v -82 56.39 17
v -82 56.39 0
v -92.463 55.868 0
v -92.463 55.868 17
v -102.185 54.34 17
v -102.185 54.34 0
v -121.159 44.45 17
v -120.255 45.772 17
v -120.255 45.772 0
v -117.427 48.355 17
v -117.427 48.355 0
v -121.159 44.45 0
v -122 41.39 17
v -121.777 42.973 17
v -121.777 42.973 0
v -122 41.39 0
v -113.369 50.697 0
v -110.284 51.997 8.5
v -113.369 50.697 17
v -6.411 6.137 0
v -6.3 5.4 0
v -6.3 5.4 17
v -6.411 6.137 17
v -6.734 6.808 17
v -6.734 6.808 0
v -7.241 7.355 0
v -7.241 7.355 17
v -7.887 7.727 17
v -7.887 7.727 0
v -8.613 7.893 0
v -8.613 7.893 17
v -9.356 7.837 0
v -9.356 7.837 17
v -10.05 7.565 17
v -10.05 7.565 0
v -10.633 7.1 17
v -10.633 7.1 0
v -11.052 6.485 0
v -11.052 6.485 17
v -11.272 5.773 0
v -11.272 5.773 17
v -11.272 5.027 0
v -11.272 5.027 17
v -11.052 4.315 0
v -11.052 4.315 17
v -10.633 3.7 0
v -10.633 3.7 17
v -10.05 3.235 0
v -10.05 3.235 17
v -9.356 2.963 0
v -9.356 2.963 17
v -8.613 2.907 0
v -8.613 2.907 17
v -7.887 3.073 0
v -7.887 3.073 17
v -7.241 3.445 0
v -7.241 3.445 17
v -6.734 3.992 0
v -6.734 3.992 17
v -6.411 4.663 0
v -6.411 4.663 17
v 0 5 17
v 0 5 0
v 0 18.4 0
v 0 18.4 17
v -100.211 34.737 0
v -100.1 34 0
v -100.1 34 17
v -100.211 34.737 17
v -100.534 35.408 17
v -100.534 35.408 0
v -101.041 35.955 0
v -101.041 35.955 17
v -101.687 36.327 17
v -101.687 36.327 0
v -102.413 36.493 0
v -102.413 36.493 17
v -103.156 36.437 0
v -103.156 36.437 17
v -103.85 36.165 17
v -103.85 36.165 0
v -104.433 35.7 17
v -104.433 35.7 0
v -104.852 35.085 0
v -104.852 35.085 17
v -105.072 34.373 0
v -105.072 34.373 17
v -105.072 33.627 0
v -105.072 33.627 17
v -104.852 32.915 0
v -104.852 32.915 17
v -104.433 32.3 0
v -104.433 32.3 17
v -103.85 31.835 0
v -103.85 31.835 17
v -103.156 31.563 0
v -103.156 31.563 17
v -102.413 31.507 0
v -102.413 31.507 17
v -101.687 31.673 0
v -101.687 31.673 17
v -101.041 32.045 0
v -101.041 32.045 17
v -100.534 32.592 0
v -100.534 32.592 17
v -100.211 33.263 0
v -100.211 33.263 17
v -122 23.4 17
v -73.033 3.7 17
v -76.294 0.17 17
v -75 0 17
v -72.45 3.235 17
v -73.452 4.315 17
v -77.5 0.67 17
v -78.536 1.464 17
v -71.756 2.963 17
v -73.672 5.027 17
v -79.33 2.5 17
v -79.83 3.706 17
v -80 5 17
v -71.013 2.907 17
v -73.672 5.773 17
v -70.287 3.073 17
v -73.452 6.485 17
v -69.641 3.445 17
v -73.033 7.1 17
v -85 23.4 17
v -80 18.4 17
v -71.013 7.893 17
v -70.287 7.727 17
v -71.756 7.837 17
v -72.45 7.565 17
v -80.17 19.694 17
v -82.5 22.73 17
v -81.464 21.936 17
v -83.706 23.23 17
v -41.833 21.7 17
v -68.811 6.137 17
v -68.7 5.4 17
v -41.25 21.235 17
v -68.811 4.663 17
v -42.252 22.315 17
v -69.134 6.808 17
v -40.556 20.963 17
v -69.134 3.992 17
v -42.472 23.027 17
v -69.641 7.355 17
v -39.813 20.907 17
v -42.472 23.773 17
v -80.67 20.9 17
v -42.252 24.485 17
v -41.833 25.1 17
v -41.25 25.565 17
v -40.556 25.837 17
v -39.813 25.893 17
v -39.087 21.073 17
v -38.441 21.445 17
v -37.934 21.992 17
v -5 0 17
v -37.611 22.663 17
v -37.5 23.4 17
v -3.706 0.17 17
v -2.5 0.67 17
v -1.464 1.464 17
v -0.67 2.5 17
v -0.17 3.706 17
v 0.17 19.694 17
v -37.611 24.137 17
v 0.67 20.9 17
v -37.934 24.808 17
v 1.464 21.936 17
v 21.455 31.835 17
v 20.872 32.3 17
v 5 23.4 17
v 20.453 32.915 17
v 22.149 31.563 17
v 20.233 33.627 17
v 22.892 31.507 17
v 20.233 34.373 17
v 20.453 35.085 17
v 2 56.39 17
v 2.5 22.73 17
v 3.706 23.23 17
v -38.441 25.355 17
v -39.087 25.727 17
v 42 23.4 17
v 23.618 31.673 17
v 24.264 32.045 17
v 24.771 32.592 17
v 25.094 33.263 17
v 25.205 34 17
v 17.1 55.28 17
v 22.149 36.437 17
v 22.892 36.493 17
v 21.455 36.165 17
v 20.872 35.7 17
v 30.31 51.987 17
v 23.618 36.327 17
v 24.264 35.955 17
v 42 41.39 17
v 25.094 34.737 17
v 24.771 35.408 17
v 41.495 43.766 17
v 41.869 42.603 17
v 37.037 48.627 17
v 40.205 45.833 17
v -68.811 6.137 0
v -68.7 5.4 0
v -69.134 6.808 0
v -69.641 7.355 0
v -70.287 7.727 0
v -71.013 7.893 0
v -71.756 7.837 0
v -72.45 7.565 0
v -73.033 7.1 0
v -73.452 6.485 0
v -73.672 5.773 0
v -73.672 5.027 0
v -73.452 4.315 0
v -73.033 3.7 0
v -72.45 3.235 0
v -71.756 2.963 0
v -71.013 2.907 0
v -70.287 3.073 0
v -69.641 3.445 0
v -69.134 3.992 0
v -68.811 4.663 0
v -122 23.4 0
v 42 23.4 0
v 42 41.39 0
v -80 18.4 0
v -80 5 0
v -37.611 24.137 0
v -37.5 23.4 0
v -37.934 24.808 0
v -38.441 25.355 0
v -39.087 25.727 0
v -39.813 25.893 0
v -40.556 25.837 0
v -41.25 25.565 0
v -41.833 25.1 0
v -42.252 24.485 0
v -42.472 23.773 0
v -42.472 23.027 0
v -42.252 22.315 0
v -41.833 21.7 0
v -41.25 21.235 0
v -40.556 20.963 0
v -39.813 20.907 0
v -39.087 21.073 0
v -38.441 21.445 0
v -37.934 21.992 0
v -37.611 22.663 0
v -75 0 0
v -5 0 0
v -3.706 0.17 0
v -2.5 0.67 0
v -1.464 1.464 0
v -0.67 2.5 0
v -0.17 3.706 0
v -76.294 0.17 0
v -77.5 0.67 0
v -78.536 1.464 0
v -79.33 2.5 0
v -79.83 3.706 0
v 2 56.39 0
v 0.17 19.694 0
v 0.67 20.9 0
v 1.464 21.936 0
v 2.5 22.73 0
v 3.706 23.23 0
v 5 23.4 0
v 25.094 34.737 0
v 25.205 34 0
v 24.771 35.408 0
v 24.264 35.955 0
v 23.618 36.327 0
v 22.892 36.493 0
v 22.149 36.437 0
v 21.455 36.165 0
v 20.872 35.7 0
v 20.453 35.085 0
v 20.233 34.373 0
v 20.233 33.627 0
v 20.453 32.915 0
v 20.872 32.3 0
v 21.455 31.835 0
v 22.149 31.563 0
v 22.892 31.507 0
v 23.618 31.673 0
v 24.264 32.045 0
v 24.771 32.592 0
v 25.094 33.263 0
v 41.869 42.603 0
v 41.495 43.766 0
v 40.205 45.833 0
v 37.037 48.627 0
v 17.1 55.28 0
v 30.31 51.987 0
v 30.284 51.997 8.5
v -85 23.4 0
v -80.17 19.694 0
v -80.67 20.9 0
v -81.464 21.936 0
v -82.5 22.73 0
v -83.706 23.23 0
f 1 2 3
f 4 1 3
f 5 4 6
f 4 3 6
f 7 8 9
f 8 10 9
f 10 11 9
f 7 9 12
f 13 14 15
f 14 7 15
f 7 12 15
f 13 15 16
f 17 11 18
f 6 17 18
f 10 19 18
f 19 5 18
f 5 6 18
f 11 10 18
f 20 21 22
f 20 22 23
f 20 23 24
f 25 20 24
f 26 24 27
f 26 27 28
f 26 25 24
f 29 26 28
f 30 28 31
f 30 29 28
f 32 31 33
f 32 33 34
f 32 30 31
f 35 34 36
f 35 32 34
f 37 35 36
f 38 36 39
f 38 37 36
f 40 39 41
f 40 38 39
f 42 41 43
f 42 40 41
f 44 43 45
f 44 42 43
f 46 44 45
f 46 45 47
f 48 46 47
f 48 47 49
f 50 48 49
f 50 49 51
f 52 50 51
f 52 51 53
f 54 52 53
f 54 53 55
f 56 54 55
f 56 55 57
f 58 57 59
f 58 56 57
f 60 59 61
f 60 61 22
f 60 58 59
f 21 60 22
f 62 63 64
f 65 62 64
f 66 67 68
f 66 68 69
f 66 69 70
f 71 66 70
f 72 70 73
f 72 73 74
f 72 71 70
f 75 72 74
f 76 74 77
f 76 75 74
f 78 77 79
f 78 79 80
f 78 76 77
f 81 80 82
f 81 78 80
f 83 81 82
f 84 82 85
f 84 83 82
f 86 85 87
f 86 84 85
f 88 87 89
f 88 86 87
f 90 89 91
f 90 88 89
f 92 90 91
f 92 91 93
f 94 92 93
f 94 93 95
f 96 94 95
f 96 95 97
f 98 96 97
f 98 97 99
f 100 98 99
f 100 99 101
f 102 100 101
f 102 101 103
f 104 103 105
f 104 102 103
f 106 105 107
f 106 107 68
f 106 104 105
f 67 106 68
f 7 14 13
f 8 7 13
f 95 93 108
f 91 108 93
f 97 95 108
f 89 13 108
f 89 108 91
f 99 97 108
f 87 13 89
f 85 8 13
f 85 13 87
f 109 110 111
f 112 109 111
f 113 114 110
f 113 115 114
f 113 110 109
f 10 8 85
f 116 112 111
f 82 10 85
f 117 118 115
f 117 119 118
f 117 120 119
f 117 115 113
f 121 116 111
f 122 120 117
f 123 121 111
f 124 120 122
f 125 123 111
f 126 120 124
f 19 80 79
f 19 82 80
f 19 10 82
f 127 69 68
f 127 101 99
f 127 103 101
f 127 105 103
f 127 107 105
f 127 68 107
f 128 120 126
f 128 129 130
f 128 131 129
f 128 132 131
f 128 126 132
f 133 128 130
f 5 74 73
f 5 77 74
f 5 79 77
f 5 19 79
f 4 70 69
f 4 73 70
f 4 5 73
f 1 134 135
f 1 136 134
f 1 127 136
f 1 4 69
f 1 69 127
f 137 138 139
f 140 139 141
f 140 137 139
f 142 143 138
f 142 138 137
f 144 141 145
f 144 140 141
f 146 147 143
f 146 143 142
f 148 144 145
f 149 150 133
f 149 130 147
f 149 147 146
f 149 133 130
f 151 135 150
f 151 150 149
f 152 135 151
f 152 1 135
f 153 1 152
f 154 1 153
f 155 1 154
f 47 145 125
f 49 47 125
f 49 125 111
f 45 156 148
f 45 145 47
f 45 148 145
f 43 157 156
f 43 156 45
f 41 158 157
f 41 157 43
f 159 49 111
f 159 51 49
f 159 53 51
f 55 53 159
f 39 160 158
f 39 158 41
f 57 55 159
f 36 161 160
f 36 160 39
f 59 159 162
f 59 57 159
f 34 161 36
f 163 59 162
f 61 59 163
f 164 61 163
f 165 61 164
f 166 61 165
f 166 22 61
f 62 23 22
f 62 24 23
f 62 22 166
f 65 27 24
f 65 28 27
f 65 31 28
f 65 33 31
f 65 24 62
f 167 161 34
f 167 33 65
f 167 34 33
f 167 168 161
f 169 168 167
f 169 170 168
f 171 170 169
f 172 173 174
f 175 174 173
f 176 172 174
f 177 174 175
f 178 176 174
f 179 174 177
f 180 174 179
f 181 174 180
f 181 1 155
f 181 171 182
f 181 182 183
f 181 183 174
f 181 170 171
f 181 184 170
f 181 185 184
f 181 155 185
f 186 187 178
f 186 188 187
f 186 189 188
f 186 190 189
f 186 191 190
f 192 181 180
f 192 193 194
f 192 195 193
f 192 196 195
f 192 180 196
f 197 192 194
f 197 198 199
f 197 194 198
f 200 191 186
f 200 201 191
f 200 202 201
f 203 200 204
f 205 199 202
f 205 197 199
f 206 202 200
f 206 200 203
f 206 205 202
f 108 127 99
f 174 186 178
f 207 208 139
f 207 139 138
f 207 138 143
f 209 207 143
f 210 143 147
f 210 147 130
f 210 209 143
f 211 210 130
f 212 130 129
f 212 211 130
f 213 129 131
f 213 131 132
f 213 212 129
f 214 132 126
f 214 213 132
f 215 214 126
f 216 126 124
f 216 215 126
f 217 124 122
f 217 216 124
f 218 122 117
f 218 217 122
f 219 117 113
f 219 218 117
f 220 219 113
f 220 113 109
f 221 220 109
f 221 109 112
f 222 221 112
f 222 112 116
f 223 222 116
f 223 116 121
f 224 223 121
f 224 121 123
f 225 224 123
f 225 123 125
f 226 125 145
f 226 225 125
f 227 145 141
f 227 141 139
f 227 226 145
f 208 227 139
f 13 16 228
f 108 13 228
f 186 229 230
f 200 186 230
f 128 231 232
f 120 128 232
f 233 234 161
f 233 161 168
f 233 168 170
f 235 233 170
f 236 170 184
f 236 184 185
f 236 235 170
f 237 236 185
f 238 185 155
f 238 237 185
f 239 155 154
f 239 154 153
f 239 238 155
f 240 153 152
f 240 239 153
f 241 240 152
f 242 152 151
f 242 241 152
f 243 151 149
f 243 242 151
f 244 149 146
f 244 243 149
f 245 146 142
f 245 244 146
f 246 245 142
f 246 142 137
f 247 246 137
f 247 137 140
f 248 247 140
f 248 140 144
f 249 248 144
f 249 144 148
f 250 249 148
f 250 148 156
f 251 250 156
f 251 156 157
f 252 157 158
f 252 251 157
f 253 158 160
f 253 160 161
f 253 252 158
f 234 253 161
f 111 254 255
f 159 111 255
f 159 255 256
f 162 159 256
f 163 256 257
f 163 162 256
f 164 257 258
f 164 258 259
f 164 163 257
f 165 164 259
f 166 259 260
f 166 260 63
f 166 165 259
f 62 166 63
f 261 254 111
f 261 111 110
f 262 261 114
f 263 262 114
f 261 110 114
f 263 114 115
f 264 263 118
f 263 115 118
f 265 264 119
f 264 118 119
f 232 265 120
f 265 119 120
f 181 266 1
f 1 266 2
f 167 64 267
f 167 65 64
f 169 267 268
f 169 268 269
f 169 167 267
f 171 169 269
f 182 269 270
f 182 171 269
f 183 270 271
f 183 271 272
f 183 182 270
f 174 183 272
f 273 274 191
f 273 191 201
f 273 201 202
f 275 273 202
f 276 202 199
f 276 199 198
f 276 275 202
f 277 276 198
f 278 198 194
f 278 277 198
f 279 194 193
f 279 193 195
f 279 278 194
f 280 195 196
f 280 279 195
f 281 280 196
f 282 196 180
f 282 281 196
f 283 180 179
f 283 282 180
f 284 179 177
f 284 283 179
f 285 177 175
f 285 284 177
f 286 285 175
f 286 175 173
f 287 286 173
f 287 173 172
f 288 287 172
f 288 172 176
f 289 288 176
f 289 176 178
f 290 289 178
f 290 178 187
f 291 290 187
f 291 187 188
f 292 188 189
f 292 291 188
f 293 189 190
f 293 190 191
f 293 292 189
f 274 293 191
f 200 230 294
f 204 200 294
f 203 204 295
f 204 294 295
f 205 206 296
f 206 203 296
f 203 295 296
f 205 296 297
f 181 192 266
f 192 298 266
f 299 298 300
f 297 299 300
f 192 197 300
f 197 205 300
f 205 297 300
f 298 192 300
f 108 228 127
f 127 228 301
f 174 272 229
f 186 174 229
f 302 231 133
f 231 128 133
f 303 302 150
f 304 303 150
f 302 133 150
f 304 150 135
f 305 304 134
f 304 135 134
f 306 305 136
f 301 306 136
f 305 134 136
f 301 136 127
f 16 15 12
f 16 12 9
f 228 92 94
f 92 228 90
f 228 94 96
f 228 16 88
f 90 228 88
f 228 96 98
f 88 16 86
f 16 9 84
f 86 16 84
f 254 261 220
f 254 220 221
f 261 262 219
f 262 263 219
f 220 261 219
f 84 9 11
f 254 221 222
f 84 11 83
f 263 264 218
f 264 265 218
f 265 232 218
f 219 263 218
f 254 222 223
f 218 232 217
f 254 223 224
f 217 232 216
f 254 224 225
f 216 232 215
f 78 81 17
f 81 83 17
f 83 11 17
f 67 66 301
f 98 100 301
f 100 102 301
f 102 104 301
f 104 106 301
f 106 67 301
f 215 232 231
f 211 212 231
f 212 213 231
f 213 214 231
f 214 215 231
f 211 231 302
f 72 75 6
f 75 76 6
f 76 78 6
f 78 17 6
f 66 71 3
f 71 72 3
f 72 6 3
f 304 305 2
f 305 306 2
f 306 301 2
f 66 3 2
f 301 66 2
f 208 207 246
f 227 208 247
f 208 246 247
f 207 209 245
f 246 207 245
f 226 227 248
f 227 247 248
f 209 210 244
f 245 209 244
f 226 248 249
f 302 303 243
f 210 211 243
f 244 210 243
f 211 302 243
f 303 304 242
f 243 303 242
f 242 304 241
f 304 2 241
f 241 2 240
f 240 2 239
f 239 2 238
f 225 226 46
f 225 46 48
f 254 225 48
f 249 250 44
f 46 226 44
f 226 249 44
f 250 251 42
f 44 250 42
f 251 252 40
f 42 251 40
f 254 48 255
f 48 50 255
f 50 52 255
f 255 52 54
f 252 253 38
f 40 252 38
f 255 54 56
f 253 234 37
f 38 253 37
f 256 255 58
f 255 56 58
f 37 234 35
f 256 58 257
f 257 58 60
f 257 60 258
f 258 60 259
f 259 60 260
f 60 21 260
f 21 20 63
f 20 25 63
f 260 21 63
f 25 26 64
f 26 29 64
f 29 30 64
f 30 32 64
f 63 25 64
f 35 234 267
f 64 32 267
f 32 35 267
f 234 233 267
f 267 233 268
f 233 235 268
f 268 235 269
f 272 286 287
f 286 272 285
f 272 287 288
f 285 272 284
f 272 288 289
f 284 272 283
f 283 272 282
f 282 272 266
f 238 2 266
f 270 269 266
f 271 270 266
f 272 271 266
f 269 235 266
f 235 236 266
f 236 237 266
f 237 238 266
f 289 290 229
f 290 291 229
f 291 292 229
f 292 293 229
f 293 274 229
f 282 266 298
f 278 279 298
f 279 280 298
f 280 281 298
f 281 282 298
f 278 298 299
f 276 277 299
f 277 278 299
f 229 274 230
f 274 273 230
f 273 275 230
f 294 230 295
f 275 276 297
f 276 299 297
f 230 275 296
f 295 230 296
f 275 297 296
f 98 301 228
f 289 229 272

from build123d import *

# Parameters (mm, degrees)
SKETCH_1_R      = 2.5
EXTRUDE_1_DEPTH = 17
FILLET_1_SIZE   = 15
FILLET_1_SIZE_2 = 40
FILLET_2_R      = 5


with BuildPart() as part:
    # 草图1 → 凸台-拉伸1 (new body)
    with BuildSketch(Plane.XY):
        Polygon((-80, 0), (0, 0), (0, 23.4), (42, 23.4), (42, 56.39), (-122, 56.39), (-122, 23.4), (-80, 23.4), align=None)
        with Locations((-40, 23.4)):
            Circle(SKETCH_1_R, mode=Mode.SUBTRACT)
        with Locations((-71.2, 5.4)):
            Circle(SKETCH_1_R, mode=Mode.SUBTRACT)
        with Locations((-8.8, 5.4)):
            Circle(SKETCH_1_R, mode=Mode.SUBTRACT)
        with Locations((-102.6, 34)):
            Circle(SKETCH_1_R, mode=Mode.SUBTRACT)
        with Locations((22.705, 34)):
            Circle(SKETCH_1_R, mode=Mode.SUBTRACT)
    extrude(amount=EXTRUDE_1_DEPTH)

    # 圆角1
    # an asymmetric fillet: 40, 15 mm, written as the material it takes off along each edge
    with BuildSketch(Plane(origin=(42, 56.39, -100), x_dir=(0, -1, 0), z_dir=(0, 0, 1))) as fillet_1_piece_1:
        with BuildLine():
            Bezier((FILLET_1_SIZE, 0), (0, 0), (0, -FILLET_1_SIZE_2), weights=[1, 0.707106781, 1])
            Line((0, -FILLET_1_SIZE_2), (0, 0))
            Line((0, 0), (FILLET_1_SIZE, 0))
        make_face()
    extrude(amount=217, mode=Mode.SUBTRACT)
    with BuildSketch(Plane(origin=(-122, 56.39, -100), x_dir=(1, 0, 0), z_dir=(0, 0, 1))) as fillet_1_piece_2:
        with BuildLine():
            Bezier((FILLET_1_SIZE_2, 0), (0, 0), (0, -FILLET_1_SIZE), weights=[1, 0.707106781, 1])
            Line((0, -FILLET_1_SIZE), (0, 0))
            Line((0, 0), (FILLET_1_SIZE_2, 0))
        make_face()
    extrude(amount=217, mode=Mode.SUBTRACT)

    # 圆角2
    fillet_2_edges = [part.edges().sort_by_distance(p)[0] for p in [
        (0, 0, 8.5),
        (-80, 0, 8.5),
        (-80, 23.4, 8.5),
        (0, 23.4, 8.5),
    ]]
    fillet(fillet_2_edges, radius=FILLET_2_R)


solid = part.part
